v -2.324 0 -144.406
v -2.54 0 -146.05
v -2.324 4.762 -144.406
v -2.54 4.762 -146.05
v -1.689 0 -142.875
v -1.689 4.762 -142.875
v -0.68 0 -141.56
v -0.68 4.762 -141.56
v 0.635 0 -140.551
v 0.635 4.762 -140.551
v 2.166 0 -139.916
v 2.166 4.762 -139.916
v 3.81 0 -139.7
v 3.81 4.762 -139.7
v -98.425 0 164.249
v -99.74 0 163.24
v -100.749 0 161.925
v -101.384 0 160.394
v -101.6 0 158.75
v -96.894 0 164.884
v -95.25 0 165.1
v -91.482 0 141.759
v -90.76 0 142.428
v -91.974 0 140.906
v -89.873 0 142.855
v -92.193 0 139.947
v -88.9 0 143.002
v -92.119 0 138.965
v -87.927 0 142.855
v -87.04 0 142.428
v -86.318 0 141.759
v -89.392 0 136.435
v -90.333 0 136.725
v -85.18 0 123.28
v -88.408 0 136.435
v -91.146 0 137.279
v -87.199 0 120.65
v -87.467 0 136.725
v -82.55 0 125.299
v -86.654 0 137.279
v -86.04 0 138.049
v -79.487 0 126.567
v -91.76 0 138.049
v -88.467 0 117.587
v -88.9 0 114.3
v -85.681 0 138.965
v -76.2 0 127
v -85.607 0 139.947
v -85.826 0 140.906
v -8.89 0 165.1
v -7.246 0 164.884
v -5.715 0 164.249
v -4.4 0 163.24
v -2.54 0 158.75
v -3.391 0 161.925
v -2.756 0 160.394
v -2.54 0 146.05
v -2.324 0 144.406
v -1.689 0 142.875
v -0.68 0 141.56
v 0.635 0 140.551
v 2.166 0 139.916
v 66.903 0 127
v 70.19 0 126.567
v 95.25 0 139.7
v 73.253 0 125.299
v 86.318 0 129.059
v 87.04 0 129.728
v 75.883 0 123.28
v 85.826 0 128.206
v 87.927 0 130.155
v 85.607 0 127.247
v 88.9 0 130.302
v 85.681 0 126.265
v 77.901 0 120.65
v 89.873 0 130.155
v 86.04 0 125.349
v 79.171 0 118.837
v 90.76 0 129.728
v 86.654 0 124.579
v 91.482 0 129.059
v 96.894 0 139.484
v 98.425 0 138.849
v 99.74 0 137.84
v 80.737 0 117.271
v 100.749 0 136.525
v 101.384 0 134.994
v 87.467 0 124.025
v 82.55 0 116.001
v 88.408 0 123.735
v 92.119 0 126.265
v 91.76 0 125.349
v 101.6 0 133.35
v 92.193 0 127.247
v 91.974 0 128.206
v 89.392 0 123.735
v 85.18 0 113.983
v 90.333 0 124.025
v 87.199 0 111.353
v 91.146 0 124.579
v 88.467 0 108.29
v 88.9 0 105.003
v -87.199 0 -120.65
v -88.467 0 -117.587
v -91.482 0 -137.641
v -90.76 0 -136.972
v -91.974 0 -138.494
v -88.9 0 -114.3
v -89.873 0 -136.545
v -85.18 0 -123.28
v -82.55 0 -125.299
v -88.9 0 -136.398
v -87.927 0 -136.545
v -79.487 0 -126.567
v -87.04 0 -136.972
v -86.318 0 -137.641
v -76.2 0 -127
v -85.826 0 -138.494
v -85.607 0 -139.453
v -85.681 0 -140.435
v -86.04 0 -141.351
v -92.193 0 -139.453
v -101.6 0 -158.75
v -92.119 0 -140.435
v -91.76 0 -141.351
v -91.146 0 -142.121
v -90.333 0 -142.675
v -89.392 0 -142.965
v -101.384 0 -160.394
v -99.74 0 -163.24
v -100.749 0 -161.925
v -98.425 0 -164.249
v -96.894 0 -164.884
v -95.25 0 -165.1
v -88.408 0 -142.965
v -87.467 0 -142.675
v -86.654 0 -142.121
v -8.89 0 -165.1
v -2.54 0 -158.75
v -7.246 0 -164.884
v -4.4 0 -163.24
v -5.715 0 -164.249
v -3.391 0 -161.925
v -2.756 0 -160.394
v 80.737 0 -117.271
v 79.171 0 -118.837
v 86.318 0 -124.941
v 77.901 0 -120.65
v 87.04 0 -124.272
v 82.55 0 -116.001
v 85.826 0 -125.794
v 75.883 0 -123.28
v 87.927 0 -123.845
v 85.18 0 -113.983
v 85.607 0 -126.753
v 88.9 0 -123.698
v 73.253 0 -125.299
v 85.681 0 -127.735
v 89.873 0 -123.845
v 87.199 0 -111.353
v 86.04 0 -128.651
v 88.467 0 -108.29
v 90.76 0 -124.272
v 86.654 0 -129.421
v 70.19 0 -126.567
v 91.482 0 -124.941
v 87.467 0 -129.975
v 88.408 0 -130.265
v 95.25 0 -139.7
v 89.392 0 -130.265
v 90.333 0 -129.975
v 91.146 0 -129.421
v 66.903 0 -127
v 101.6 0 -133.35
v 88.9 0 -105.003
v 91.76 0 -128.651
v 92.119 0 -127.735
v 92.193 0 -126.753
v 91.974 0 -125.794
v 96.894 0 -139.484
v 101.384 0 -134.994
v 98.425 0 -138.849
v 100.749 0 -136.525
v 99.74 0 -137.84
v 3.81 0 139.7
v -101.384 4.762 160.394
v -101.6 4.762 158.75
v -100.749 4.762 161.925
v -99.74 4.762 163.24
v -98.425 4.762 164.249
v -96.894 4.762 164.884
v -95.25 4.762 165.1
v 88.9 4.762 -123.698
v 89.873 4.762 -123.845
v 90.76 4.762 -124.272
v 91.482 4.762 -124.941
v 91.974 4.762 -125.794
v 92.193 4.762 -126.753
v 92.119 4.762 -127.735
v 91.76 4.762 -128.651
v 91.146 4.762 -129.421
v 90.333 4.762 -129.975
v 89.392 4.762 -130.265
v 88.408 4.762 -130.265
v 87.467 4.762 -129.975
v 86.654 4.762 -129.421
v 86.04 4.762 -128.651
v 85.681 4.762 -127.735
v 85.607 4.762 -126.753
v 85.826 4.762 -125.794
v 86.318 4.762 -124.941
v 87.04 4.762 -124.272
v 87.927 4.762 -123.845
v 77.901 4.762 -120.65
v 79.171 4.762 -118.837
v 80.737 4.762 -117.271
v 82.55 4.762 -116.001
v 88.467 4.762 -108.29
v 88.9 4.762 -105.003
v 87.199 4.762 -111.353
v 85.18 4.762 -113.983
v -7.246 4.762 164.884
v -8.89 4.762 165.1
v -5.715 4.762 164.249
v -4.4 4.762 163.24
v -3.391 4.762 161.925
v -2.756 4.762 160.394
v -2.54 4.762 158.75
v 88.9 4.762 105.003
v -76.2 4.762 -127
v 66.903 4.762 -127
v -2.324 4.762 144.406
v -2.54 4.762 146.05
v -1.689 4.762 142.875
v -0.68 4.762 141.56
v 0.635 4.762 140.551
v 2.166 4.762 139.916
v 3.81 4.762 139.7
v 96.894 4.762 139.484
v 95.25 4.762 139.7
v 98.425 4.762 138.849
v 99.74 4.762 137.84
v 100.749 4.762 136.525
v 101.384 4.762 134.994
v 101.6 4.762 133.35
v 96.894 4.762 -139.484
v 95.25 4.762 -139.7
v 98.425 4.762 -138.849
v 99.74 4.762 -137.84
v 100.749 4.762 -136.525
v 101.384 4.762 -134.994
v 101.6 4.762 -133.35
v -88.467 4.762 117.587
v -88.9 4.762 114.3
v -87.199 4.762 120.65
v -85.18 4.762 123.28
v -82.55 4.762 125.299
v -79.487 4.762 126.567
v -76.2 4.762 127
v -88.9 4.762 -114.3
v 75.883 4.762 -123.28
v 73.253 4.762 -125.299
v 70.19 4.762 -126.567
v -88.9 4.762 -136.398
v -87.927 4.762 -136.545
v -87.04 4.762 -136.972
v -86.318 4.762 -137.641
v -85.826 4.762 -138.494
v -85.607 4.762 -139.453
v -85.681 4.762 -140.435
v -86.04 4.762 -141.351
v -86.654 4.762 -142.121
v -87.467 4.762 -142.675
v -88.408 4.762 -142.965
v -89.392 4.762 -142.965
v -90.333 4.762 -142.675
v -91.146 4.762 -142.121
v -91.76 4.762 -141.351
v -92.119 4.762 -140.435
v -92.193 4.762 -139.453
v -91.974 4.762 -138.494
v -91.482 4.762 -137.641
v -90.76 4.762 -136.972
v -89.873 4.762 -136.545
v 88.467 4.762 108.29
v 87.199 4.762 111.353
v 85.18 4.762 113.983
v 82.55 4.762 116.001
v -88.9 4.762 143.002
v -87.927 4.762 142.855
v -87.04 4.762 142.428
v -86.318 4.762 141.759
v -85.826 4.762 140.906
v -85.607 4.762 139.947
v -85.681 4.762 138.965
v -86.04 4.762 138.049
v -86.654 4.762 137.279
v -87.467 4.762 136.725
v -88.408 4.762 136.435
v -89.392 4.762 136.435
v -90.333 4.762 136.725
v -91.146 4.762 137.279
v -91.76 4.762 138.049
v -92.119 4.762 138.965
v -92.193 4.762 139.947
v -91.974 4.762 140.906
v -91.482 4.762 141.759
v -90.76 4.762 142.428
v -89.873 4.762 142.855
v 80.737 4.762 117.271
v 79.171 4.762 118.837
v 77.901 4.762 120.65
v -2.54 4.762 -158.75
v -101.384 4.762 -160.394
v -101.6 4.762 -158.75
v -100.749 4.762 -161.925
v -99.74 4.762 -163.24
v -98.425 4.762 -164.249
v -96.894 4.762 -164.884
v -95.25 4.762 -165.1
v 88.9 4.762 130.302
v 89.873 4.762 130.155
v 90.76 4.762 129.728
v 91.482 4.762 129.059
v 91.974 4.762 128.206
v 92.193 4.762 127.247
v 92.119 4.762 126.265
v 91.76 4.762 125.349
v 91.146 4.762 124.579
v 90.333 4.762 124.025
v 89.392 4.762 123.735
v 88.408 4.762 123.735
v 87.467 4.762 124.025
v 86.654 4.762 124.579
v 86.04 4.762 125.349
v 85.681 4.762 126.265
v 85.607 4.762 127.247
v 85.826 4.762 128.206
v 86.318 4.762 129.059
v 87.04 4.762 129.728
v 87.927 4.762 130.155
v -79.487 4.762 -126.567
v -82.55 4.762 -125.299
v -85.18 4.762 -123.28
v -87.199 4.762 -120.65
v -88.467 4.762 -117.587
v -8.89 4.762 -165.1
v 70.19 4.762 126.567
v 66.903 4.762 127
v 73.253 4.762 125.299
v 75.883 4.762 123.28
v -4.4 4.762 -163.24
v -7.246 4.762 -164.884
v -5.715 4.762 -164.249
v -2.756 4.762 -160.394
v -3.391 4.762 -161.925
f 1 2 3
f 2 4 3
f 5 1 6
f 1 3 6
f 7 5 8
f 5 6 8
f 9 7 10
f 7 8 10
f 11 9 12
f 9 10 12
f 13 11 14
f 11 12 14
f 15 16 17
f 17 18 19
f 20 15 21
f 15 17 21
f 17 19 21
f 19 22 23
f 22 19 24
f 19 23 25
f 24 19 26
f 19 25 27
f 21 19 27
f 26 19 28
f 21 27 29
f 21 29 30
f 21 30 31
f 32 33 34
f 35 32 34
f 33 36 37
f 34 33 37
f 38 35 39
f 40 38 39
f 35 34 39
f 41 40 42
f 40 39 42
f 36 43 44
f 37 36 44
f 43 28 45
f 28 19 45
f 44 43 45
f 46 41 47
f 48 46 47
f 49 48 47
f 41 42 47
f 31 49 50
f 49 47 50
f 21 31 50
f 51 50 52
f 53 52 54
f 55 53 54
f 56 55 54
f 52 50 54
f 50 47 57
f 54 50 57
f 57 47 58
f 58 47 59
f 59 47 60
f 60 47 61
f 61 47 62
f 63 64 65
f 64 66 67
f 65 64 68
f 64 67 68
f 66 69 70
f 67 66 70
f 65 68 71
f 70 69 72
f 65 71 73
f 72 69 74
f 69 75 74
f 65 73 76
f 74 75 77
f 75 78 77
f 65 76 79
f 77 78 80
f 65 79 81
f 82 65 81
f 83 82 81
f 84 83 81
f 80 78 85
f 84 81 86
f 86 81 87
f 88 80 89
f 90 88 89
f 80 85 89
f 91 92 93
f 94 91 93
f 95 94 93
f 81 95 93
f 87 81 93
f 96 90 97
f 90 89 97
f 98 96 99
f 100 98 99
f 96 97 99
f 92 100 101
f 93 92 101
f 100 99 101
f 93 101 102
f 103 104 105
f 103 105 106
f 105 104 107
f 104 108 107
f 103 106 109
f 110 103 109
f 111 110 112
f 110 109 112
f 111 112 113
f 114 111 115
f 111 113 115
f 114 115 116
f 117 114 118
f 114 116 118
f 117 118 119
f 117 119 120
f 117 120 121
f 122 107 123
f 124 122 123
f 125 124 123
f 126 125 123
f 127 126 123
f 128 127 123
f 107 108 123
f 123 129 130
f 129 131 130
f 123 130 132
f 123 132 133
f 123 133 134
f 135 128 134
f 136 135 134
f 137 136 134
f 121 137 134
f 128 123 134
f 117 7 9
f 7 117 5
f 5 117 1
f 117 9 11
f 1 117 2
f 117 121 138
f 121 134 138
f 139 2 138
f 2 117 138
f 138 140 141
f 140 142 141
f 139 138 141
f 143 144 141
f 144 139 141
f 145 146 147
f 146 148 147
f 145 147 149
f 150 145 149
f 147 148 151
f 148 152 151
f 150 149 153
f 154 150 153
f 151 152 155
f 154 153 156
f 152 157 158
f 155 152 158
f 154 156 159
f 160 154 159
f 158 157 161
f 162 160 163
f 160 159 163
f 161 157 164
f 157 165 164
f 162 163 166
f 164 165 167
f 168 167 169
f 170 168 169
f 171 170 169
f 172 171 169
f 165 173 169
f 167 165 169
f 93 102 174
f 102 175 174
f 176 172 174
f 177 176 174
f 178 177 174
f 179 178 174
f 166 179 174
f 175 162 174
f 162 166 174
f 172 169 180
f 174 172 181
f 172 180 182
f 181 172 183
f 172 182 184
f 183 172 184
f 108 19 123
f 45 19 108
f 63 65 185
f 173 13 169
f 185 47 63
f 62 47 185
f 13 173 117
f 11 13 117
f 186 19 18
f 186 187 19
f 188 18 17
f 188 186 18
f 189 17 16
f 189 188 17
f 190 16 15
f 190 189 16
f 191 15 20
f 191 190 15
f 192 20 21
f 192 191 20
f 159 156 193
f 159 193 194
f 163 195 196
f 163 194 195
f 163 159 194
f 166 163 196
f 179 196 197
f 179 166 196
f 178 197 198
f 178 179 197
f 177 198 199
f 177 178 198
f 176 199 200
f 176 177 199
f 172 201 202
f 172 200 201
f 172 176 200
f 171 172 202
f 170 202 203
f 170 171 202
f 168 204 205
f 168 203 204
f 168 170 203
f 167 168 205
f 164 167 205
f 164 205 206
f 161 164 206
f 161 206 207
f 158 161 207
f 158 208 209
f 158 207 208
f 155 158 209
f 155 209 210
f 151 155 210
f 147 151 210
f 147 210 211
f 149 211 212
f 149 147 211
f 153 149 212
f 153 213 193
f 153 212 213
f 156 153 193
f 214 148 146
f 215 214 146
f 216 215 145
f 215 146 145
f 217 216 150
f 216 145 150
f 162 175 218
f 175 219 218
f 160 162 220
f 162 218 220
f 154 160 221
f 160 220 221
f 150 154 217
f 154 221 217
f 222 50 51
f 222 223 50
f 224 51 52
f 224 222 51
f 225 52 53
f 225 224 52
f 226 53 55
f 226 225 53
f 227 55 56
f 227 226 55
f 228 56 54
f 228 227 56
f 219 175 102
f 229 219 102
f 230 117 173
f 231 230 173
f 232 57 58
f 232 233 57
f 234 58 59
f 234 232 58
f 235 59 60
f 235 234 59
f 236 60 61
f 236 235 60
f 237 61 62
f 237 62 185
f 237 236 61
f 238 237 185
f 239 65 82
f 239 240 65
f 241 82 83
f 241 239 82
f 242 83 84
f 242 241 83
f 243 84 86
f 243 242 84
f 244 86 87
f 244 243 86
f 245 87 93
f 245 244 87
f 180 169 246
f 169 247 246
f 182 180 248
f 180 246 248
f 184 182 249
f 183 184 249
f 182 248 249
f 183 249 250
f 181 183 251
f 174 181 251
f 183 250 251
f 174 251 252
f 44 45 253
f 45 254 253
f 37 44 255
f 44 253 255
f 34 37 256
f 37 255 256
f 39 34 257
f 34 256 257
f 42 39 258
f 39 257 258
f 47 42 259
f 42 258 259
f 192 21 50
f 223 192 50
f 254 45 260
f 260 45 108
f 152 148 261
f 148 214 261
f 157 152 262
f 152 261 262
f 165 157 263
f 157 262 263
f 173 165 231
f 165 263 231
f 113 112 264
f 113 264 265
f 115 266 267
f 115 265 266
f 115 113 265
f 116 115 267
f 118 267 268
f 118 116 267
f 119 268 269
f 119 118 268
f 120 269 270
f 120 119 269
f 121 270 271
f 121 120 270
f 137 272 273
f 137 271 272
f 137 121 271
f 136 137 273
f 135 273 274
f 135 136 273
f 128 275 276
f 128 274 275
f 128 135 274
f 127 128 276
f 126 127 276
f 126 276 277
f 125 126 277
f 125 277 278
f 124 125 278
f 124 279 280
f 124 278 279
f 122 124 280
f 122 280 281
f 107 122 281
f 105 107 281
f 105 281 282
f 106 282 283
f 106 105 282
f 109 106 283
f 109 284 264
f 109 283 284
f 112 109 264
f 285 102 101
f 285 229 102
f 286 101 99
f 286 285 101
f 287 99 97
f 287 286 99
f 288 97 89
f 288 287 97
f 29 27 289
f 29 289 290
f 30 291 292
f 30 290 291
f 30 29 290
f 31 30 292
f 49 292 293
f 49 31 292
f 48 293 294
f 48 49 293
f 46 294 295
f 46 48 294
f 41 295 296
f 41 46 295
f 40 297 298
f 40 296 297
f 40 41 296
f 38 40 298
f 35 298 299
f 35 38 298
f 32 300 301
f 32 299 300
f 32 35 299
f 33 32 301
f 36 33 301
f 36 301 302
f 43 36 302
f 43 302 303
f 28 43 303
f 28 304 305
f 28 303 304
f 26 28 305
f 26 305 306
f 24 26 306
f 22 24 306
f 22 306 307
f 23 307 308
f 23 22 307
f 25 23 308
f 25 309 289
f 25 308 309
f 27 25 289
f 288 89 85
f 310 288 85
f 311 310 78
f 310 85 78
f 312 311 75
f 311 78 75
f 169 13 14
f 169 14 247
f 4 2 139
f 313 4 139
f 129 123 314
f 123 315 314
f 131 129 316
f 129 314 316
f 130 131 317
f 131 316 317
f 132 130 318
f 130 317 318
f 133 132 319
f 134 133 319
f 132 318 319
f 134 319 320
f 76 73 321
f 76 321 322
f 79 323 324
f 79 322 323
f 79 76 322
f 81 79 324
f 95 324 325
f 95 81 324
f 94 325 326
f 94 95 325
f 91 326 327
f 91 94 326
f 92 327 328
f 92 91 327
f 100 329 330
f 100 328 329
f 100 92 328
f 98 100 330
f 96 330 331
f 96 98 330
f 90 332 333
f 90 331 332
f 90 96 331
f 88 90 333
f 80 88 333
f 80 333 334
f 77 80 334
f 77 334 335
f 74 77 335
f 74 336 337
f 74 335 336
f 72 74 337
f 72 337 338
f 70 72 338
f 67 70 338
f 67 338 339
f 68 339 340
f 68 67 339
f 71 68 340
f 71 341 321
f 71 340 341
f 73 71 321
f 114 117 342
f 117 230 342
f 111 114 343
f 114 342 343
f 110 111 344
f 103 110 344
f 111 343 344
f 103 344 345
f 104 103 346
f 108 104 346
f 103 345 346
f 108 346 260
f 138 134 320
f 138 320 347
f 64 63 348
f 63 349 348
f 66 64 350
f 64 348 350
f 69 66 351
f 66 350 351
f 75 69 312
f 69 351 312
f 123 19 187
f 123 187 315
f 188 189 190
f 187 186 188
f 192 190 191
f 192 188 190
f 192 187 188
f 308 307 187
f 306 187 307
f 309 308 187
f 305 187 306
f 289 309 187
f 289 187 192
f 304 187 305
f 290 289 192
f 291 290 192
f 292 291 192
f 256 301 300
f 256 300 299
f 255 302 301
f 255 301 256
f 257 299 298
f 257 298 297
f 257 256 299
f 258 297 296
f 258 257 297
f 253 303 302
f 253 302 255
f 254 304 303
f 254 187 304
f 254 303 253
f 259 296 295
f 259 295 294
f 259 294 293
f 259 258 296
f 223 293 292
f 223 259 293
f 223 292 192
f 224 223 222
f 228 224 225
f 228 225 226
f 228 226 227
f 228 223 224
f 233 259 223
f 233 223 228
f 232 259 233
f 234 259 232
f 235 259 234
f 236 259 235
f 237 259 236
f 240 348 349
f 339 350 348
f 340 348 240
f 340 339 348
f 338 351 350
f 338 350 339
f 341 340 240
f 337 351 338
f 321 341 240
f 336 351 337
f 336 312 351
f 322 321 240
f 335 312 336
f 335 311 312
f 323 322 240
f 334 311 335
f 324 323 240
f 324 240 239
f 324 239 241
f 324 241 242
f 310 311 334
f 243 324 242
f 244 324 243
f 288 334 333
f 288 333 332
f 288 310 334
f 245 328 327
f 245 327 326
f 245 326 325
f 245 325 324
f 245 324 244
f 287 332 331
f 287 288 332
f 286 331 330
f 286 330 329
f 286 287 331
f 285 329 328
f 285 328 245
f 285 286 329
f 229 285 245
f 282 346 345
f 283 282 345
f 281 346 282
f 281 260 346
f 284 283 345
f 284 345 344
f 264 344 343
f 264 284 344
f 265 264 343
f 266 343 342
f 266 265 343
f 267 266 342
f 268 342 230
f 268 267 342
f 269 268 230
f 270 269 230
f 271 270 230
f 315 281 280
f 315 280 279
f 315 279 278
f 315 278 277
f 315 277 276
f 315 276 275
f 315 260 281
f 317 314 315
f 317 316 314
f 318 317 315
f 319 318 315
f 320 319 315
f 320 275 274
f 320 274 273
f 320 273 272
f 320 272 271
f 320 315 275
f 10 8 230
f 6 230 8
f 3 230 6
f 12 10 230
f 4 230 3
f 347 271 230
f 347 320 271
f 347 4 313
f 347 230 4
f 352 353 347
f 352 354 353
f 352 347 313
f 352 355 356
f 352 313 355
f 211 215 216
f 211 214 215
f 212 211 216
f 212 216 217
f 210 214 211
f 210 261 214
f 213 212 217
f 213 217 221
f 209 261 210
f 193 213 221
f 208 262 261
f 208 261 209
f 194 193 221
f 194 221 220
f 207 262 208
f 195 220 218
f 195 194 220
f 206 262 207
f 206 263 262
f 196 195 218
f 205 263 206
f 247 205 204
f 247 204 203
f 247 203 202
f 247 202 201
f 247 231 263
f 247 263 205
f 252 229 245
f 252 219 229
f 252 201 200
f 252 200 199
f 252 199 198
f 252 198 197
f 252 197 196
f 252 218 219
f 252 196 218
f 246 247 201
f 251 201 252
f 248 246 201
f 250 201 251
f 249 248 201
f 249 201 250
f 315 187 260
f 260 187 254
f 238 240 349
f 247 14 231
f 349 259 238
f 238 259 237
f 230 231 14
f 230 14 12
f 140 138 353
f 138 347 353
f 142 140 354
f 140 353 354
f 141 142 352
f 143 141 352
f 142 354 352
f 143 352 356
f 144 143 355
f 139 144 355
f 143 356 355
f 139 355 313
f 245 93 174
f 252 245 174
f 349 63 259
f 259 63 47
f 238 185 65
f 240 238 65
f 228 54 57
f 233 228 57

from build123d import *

# Parameters (mm, degrees)
SKETCH1_W                 = 203.2
SKETCH1_H                 = 330.2
BASE_DEPTH                = 4.7625
HOLES_DEPTH               = 194.915578039
HOLES_DEPTH_BACK          = 194.915578039
SKETCH2_R                 = 3.302
SUS_TAB_CUTOUT_DEPTH      = 194.915578039
SUS_TAB_CUTOUT_DEPTH_BACK = 194.915578039
SKETCH3_W                 = 104.14
SKETCH3_H                 = 25.4
INNER_CUTOUT_DEPTH        = 194.915578039
INNER_CUTOUT_DEPTH_BACK   = 194.915578039
FILLET1_R                 = 6.35
FILLET2_R                 = 12.7


with BuildPart() as part:
    # Sketch1 → Base (new body)
    with BuildSketch(Plane(origin=(0, 0, 0), x_dir=(1, 0, 0), z_dir=(0, 1, 0))):
        Rectangle(SKETCH1_W, SKETCH1_H)
    extrude(amount=BASE_DEPTH)

    # Sketch2 → Holes (cut, two sides: drawn at the far end of the back side and taken through both)
    with BuildSketch(Plane(origin=(0, 4.7625, 0), x_dir=(1, 0, 0), z_dir=(0, 1, 0)).offset(-HOLES_DEPTH_BACK)):
        with Locations(Location((-88.9, 139.7, 0), (0, 0, 270))):
            Circle(SKETCH2_R)
        with Locations(Location((-88.9, -139.7, 0), (0, 0, 270))):
            Circle(SKETCH2_R)
        with Locations(Location((88.9, -127, 0), (0, 0, 270))):
            Circle(SKETCH2_R)
        with Locations(Location((88.9, 127, 0), (0, 0, 270))):
            Circle(SKETCH2_R)
    extrude(amount=HOLES_DEPTH + HOLES_DEPTH_BACK, mode=Mode.SUBTRACT)

    # Sketch3 → Sus Tab Cutout (cut, two sides: drawn at the far end of the back side and taken through both)
    with BuildSketch(Plane(origin=(0, 4.7625, 0), x_dir=(1, 0, 0), z_dir=(0, 1, 0)).offset(-SUS_TAB_CUTOUT_DEPTH_BACK)):
        with Locations((49.53, 152.4)):
            Rectangle(SKETCH3_W, SKETCH3_H)
        with Locations((49.53, -152.4)):
            Rectangle(SKETCH3_W, SKETCH3_H)
    extrude(amount=SUS_TAB_CUTOUT_DEPTH + SUS_TAB_CUTOUT_DEPTH_BACK, mode=Mode.SUBTRACT)

    # Sketch4 → Inner Cutout (cut, two sides: drawn at the far end of the back side and taken through both)
    with BuildSketch(Plane(origin=(0, 4.7625, 0), x_dir=(1, 0, 0), z_dir=(0, 1, 0)).offset(-INNER_CUTOUT_DEPTH_BACK)):
        with BuildLine():
            Line((88.9, 114.3), (88.9, -114.3))
            ThreePointArc((88.9, -114.3), (79.919743879, -118.019743879), (76.2, -127))
            Line((76.2, -127), (-88.9, -127))
            Line((-88.9, -127), (-88.9, 127))
            Line((-88.9, 127), (76.2, 127))
            ThreePointArc((76.2, 127), (79.919743879, 118.019743879), (88.9, 114.3))
        make_face()
    extrude(amount=INNER_CUTOUT_DEPTH + INNER_CUTOUT_DEPTH_BACK, mode=Mode.SUBTRACT)

    # Fillet1
    fillet1_edges = [part.edges().sort_by_distance(p)[0] for p in [
        (-2.54, 2.38125, -165.1),
        (101.6, 2.38125, -139.7),
        (-2.54, 2.38125, -139.7),
        (-2.54, 2.38125, 165.1),
        (-2.54, 2.38125, 139.7),
        (101.6, 2.38125, 139.7),
        (-101.6, 2.38125, 165.1),
        (-101.6, 2.38125, -165.1),
    ]]
    fillet(fillet1_edges, radius=FILLET1_R)

    # Fillet2
    fillet2_edges = [part.edges().sort_by_distance(p)[0] for p in [
        (-88.9, 2.38125, -127),
        (76.2, 2.38125, -127),
        (88.9, 2.38125, -114.3),
        (88.9, 2.38125, 114.3),
        (76.2, 2.38125, 127),
        (-88.9, 2.38125, 127),
    ]]
    fillet(fillet2_edges, radius=FILLET2_R)


solid = part.part
